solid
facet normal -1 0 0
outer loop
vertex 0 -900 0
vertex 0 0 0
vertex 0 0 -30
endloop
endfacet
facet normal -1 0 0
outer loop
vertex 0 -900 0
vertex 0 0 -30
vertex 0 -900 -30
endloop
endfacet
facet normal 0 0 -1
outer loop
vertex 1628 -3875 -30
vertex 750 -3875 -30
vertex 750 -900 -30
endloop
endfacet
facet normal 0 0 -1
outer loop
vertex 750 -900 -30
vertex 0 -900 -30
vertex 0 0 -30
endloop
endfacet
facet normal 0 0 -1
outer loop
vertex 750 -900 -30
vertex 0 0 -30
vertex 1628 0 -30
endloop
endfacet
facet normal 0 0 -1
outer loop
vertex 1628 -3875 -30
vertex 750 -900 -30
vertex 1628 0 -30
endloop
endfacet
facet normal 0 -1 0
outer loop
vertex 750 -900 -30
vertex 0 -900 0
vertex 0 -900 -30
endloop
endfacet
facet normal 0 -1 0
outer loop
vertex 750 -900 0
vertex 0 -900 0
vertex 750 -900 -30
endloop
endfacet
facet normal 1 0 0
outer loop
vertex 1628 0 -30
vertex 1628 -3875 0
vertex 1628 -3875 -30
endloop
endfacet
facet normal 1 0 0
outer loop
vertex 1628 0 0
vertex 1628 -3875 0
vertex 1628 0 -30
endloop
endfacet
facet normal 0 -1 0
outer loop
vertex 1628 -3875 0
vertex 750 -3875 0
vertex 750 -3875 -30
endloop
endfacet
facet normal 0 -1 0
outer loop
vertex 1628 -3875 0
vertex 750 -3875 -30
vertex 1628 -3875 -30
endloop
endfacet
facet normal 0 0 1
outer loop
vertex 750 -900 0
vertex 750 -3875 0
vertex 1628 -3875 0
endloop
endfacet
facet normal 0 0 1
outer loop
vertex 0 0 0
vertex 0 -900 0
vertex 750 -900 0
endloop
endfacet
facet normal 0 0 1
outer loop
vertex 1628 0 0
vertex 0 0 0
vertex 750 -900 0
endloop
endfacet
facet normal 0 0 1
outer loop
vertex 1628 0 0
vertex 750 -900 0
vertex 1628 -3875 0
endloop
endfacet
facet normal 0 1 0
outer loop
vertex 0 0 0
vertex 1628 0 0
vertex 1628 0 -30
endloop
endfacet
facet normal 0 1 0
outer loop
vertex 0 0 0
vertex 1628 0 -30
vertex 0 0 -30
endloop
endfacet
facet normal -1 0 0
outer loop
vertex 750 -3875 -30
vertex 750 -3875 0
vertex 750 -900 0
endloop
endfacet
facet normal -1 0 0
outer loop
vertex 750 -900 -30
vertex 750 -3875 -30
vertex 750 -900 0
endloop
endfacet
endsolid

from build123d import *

# Parameters (mm, degrees)
TABAN_FLAN_1_DEPTH = 30
IZIM3_W            = 878
IZIM3_H            = 1001
SEKME1_DEPTH       = 30


# Sheet-metal steps are written as plain solids
with BuildPart() as part:
    # Çizim1 → Taban-Flanş1 (new body)
    with BuildSketch(Plane.XY):
        Polygon((0, 0), (0, -900), (750, -900), (750, -2874), (1628, -2874), (1628, 0), align=None)
    extrude(amount=-TABAN_FLAN_1_DEPTH)

    # Çizim3 → Sekme1 (add)
    with BuildSketch(Plane.XY):
        with Locations((1189, -3374.5)):
            Rectangle(IZIM3_W, IZIM3_H)
    extrude(amount=-SEKME1_DEPTH)


solid = part.part
